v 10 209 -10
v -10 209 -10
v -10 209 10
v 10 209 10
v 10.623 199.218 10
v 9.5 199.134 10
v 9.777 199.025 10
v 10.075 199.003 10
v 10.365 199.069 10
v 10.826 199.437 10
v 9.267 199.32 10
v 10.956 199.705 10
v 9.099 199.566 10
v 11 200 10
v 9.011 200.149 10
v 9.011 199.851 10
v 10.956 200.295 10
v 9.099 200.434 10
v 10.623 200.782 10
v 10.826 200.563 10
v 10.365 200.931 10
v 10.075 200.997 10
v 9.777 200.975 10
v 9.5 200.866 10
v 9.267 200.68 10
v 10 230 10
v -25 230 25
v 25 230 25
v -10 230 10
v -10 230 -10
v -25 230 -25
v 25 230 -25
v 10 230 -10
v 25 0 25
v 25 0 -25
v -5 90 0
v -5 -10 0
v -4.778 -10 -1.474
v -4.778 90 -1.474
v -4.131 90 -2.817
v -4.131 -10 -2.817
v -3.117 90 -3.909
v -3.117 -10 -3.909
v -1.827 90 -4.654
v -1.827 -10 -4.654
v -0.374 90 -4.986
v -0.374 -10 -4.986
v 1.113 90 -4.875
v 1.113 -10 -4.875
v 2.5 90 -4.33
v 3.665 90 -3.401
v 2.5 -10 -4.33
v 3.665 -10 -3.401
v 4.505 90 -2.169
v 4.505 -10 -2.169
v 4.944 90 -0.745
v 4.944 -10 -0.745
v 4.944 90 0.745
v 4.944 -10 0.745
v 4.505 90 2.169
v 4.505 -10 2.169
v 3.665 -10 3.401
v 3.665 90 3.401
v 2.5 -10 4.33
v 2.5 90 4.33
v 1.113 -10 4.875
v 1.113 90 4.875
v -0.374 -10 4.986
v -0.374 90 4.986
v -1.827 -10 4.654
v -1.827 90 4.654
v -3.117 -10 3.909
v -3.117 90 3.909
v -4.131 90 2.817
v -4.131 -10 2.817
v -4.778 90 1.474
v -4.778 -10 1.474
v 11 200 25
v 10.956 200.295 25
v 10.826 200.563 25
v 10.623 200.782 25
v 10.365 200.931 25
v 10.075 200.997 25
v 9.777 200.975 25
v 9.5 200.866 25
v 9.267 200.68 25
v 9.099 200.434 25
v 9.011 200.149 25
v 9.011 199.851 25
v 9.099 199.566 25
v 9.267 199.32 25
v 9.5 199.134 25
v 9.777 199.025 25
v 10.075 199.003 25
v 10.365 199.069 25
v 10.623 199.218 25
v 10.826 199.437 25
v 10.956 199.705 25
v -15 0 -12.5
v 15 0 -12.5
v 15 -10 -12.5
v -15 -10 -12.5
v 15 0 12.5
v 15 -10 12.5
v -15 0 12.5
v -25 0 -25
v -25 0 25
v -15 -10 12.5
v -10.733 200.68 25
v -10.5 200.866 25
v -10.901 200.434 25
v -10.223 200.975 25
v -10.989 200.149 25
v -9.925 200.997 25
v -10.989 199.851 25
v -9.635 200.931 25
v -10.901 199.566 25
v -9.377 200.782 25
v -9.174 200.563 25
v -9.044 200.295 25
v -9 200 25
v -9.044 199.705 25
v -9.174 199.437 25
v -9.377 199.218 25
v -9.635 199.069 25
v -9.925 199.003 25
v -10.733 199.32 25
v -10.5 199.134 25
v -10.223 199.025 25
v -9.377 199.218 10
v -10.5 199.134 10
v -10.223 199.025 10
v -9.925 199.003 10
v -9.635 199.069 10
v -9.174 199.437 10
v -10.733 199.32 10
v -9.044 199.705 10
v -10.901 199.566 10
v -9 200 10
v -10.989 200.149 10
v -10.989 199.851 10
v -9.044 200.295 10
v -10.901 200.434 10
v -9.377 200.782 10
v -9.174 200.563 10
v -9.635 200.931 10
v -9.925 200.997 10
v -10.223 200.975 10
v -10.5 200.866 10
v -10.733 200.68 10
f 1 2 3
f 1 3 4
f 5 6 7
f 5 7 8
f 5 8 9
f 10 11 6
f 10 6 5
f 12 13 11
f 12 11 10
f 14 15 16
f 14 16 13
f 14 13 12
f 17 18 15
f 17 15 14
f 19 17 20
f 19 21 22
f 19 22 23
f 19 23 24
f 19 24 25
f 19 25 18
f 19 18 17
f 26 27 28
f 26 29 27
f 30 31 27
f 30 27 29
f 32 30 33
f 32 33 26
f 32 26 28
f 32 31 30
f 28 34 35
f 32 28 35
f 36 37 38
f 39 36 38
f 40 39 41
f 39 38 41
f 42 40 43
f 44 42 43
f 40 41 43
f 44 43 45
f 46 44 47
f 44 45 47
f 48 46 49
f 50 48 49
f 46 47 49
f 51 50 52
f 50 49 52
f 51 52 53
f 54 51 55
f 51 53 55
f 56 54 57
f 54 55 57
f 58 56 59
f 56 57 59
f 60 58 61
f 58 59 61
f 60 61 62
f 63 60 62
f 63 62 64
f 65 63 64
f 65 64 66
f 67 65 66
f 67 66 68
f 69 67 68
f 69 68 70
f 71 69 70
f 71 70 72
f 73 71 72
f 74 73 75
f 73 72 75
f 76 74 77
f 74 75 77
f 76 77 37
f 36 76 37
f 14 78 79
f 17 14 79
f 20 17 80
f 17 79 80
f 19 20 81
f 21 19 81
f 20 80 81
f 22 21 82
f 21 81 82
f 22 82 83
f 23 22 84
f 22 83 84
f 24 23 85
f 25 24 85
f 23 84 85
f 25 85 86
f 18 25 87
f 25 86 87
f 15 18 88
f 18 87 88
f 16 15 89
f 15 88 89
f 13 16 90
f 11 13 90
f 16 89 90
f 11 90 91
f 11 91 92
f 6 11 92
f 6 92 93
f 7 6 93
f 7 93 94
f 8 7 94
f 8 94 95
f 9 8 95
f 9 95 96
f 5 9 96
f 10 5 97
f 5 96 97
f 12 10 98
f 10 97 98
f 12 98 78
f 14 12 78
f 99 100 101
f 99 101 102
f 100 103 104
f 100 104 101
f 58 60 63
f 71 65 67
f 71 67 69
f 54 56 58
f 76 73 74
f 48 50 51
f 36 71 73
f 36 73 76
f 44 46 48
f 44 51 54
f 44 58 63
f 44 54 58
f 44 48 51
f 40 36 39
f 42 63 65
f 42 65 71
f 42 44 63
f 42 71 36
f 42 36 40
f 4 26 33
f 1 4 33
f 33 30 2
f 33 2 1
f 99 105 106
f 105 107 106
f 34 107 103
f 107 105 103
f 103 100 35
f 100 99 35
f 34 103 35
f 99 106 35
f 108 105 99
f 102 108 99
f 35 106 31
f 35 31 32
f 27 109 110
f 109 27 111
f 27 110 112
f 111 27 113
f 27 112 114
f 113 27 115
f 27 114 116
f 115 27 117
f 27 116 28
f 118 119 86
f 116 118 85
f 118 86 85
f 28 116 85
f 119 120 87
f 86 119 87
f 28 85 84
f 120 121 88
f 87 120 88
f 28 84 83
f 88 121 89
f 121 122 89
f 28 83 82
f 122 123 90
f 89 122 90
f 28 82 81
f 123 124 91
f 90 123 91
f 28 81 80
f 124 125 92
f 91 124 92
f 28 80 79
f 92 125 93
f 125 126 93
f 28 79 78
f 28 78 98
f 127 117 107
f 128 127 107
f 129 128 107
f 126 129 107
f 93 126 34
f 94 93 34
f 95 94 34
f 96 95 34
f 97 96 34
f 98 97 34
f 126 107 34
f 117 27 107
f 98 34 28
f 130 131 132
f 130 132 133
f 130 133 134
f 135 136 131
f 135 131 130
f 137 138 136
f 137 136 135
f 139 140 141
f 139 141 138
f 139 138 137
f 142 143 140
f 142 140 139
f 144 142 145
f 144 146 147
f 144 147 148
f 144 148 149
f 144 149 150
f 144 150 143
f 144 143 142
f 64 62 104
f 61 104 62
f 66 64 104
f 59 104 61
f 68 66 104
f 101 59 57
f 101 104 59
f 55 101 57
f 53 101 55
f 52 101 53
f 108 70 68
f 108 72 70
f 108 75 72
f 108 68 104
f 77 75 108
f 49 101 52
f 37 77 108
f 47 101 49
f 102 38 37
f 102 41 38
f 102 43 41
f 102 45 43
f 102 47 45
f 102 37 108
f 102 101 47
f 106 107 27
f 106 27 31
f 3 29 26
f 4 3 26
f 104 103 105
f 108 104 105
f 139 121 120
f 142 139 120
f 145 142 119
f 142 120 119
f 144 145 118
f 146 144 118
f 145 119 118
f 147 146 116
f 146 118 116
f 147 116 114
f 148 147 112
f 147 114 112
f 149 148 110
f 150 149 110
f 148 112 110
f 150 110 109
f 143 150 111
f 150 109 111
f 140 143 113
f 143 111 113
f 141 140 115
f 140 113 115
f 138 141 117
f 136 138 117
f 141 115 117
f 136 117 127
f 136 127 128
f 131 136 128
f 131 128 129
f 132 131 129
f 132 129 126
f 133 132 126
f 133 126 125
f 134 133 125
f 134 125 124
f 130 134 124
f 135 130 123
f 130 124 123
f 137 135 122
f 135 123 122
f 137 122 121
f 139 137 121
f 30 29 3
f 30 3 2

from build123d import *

# Parameters (mm, degrees)
SKETCH1_W           = 50
SKETCH1_H           = 50
BOSS_EXTRUDE1_DEPTH = 230
SKETCH2_W           = 30
SKETCH2_H           = 25
BOSS_EXTRUDE2_DEPTH = 10
SKETCH3_R           = 5
CUT_EXTRUDE1_DEPTH  = 100
SKETCH4_W           = 20
SKETCH4_H           = 20
CUT_EXTRUDE2_DEPTH  = 21
SKETCH5_R           = 1
CUT_EXTRUDE3_DEPTH  = 15


with BuildPart() as part:
    # Sketch1 → Boss-Extrude1 (new body)
    with BuildSketch(Plane(origin=(0, 0, 0), x_dir=(1, 0, 0), z_dir=(0, 1, 0))):
        Rectangle(SKETCH1_W, SKETCH1_H)
    extrude(amount=BOSS_EXTRUDE1_DEPTH)

    # Sketch2 → Boss-Extrude2 (add)
    with BuildSketch(Plane(origin=(0, 0, 0), x_dir=(-1, 0, 0), z_dir=(0, -1, 0))):
        Rectangle(SKETCH2_W, SKETCH2_H)
    extrude(amount=BOSS_EXTRUDE2_DEPTH)

    # Sketch3 → Cut-Extrude1 (cut)
    with BuildSketch(Plane(origin=(0, -10, 0), x_dir=(-1, 0, 0), z_dir=(0, -1, 0))):
        Circle(SKETCH3_R)
    extrude(amount=-CUT_EXTRUDE1_DEPTH, mode=Mode.SUBTRACT)

    # Sketch4 → Cut-Extrude2 (cut)
    with BuildSketch(Plane(origin=(0, 230, 0), x_dir=(1, 0, 0), z_dir=(0, 1, 0))):
        Rectangle(SKETCH4_W, SKETCH4_H)
    extrude(amount=-CUT_EXTRUDE2_DEPTH, mode=Mode.SUBTRACT)

    # Sketch5 → Cut-Extrude3 (cut)
    with BuildSketch(Plane.XY.offset(25)):
        with Locations((10, 200)):
            Circle(SKETCH5_R)
        with Locations((-10, 200)):
            Circle(SKETCH5_R)
    extrude(amount=-CUT_EXTRUDE3_DEPTH, mode=Mode.SUBTRACT)


solid = part.part
